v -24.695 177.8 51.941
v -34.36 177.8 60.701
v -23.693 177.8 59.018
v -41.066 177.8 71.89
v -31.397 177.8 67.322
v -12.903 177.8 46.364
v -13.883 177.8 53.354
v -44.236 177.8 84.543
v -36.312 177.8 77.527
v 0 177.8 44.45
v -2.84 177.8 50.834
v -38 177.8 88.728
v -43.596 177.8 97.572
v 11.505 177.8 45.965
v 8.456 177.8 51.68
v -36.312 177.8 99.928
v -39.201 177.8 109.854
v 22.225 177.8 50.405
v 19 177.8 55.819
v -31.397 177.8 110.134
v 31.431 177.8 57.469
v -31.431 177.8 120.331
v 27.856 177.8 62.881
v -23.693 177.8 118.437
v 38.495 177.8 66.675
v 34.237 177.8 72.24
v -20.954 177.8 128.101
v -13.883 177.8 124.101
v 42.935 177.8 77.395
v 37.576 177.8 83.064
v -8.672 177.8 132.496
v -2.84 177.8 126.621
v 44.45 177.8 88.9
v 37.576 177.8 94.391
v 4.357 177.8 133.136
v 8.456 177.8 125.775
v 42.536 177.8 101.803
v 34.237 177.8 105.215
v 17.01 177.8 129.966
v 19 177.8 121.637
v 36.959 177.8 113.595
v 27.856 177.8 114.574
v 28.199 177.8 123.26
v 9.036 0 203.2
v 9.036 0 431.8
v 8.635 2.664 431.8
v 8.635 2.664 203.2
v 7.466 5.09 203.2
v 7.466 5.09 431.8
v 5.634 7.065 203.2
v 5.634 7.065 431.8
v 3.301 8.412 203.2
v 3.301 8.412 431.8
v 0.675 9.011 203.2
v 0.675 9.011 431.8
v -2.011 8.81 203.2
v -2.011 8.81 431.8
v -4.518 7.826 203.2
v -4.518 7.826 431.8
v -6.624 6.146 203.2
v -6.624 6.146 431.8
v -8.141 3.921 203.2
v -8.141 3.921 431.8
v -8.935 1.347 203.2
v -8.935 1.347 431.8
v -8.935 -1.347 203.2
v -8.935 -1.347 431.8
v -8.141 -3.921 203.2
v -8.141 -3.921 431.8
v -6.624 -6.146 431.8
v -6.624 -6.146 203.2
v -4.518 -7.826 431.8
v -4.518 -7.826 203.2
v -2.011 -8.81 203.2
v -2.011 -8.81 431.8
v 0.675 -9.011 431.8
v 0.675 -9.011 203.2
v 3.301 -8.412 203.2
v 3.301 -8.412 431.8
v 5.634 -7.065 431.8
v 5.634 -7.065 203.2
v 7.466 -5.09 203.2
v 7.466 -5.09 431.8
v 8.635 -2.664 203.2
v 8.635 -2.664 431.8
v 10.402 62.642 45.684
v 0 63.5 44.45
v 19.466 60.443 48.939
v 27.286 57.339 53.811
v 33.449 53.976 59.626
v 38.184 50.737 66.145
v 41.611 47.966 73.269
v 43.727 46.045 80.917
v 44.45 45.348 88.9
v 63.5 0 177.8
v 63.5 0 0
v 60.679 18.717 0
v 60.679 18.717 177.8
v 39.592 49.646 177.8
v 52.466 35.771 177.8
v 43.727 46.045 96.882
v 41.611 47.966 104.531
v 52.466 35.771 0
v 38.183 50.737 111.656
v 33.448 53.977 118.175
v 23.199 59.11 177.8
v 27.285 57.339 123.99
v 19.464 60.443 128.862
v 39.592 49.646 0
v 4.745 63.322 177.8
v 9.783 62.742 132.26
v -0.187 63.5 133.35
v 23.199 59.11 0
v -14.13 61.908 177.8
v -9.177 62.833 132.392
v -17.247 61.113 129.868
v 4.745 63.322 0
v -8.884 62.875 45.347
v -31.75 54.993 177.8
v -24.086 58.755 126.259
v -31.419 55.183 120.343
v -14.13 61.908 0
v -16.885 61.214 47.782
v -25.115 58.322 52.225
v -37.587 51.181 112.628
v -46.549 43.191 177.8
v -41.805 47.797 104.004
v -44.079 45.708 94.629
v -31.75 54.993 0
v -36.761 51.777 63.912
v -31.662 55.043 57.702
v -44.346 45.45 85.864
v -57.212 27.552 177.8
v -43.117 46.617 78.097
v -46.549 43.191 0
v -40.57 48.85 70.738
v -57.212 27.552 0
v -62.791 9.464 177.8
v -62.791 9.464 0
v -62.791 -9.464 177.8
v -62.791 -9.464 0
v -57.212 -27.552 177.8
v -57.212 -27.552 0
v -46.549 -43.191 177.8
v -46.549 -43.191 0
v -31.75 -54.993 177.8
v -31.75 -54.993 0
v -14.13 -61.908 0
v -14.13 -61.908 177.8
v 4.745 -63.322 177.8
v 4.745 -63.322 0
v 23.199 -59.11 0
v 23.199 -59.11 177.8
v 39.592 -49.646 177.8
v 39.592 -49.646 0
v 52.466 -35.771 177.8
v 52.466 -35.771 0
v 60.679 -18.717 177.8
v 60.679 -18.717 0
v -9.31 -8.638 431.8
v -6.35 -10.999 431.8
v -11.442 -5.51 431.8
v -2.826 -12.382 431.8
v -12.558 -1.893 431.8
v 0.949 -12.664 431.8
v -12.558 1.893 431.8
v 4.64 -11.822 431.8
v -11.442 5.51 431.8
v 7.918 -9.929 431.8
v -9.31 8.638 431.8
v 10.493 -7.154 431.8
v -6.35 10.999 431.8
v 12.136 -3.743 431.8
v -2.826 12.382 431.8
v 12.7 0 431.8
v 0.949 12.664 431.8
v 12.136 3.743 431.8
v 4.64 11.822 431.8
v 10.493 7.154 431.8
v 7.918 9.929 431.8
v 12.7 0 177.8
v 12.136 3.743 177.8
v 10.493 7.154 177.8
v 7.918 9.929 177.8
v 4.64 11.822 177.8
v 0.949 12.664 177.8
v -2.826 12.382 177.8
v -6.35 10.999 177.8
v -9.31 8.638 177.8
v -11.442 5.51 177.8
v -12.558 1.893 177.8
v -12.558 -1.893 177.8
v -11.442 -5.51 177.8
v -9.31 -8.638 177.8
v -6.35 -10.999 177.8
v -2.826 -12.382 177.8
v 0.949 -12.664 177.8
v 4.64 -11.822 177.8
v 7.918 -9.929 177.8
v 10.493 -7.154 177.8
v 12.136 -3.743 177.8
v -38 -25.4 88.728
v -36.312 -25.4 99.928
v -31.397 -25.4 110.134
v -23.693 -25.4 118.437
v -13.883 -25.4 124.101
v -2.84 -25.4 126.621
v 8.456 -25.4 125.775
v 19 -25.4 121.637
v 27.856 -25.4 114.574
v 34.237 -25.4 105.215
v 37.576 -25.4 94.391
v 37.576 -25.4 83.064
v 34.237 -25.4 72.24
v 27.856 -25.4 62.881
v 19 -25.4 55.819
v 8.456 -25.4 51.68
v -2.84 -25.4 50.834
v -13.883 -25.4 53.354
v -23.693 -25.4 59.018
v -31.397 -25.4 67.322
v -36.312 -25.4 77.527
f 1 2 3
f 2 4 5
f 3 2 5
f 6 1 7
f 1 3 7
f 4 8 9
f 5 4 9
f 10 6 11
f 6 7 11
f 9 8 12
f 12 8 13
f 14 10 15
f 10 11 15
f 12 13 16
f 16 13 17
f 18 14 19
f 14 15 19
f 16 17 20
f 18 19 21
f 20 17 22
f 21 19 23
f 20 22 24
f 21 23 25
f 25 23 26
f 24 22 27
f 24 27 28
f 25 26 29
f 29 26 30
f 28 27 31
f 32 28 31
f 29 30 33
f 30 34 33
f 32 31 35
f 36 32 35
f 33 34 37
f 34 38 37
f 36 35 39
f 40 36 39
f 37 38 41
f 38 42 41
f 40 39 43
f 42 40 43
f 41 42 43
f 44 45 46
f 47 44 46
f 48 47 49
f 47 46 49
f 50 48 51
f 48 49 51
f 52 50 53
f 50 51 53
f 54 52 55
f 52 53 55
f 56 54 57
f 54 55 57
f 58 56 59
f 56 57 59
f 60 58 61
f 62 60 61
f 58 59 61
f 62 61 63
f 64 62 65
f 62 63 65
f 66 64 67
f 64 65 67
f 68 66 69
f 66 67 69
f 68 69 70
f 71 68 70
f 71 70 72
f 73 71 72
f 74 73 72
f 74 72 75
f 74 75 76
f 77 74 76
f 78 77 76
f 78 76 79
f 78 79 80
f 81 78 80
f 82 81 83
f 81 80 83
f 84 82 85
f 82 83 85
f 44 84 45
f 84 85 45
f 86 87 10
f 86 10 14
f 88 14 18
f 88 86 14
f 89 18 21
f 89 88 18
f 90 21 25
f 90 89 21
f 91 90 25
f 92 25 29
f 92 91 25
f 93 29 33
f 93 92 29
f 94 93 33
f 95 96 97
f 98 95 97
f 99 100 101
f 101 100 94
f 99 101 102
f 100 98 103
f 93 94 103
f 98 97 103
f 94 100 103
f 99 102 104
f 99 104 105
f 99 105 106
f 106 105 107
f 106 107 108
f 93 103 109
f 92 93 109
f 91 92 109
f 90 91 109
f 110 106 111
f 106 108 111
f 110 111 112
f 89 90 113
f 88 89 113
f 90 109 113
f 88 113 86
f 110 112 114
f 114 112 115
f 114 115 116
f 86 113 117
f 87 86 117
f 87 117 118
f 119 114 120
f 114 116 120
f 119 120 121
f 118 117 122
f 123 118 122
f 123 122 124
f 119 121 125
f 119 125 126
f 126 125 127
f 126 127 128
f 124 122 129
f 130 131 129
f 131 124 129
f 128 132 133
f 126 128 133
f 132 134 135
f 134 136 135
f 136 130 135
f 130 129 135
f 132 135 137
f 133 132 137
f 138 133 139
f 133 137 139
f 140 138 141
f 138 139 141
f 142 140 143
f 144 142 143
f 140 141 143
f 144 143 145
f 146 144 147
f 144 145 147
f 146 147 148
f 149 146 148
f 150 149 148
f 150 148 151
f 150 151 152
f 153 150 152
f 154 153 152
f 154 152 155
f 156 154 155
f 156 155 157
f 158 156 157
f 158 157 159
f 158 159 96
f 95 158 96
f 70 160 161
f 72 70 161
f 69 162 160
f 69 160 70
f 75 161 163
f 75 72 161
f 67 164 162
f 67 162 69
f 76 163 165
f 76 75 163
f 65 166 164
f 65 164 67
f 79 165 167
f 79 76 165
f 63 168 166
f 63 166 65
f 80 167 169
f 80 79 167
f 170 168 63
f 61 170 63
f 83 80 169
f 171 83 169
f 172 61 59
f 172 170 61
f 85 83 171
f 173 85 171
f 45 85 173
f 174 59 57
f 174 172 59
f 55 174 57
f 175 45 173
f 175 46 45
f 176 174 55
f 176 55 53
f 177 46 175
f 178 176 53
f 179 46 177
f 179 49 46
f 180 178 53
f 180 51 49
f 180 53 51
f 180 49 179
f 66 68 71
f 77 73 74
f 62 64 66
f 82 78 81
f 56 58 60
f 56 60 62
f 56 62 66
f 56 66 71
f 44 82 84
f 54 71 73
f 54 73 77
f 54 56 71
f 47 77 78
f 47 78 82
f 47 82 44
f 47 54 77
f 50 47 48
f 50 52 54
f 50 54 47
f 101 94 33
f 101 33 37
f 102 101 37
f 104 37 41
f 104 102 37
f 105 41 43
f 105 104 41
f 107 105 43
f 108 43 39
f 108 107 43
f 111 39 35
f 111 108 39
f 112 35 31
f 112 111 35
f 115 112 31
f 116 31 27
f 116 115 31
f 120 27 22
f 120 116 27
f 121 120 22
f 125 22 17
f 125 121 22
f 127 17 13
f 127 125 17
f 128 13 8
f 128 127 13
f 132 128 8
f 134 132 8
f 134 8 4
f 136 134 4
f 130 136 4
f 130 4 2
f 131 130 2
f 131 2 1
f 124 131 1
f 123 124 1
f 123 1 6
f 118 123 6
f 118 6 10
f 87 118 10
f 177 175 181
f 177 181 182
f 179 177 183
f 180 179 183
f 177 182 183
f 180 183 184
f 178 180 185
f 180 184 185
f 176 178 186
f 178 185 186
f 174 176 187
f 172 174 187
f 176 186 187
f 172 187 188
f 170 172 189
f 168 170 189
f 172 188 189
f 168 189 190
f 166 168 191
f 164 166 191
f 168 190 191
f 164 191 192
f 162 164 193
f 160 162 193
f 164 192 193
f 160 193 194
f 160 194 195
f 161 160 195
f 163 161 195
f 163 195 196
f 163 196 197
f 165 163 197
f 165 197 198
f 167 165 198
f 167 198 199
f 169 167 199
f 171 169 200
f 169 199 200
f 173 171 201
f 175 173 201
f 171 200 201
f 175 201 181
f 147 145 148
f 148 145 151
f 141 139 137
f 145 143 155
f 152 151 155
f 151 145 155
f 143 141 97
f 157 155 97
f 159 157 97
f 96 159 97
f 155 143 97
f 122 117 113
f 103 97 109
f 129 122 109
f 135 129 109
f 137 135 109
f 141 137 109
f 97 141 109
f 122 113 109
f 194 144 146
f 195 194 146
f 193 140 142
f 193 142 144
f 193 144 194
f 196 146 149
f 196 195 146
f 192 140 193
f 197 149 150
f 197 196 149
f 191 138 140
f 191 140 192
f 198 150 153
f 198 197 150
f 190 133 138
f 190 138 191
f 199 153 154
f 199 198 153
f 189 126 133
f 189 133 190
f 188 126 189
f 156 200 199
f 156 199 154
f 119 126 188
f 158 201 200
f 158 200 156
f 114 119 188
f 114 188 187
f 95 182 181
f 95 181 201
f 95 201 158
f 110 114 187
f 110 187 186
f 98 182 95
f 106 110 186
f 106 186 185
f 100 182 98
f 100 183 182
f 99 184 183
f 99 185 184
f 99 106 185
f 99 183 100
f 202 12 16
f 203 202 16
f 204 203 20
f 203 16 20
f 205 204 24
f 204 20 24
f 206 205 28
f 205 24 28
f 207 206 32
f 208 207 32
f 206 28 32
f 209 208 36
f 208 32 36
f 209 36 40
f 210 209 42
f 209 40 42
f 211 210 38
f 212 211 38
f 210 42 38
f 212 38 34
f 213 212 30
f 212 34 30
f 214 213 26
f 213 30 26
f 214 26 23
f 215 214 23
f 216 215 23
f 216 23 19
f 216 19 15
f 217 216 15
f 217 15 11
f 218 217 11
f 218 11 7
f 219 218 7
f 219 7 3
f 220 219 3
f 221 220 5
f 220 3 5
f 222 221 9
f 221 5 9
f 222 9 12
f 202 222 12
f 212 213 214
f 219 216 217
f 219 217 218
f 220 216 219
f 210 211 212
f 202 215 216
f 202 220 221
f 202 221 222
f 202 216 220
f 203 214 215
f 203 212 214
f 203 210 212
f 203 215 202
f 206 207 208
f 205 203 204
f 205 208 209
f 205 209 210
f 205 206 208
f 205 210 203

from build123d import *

# Parameters (mm, degrees)
F0_R      = 63.5
F1_DEPTH  = 177.8
F3_DEPTH  = 177.8
F5_R      = 12.7
F6_DEPTH  = 254
F7_R      = 38.0000038218
F8_DEPTH  = 203.2
F9_R      = 9.036335061
F10_DEPTH = 228.6


with BuildPart() as f1:
    # F0 (on Top) → F1 (new body)
    with BuildSketch(Plane.XY):
        Circle(F0_R)
    extrude(amount=F1_DEPTH)

    # F2 (on Front) → F3 (join)
    with BuildSketch(Plane.XZ):
        with BuildLine():
            ThreePointArc((0, 44.45), (31.4308964237, 57.4691035763), (44.45, 88.9))
            ThreePointArc((44.45, 88.9), (-31.4308964237, 120.3308964237), (0, 44.45))
        make_face()
    extrude(amount=-F3_DEPTH)

    # F5 (on face) → F6 (join)
    with BuildSketch(Plane.XY.offset(177.8)):
        Circle(F5_R)
    extrude(amount=F6_DEPTH)

    # F7 (on face) → F8 (cut)
    with BuildSketch(Plane(origin=(0, 177.8, 0), x_dir=(-1, 0, 0), z_dir=(0, 1, 0))):
        with Locations((0, 88.7276828289)):
            Circle(F7_R)
    extrude(amount=-F8_DEPTH, mode=Mode.SUBTRACT)

    # F9 (on face) → F10 (cut)
    with BuildSketch(Plane.XY.offset(431.8)):
        Circle(F9_R)
    extrude(amount=-F10_DEPTH, mode=Mode.SUBTRACT)


solid = f1.part
